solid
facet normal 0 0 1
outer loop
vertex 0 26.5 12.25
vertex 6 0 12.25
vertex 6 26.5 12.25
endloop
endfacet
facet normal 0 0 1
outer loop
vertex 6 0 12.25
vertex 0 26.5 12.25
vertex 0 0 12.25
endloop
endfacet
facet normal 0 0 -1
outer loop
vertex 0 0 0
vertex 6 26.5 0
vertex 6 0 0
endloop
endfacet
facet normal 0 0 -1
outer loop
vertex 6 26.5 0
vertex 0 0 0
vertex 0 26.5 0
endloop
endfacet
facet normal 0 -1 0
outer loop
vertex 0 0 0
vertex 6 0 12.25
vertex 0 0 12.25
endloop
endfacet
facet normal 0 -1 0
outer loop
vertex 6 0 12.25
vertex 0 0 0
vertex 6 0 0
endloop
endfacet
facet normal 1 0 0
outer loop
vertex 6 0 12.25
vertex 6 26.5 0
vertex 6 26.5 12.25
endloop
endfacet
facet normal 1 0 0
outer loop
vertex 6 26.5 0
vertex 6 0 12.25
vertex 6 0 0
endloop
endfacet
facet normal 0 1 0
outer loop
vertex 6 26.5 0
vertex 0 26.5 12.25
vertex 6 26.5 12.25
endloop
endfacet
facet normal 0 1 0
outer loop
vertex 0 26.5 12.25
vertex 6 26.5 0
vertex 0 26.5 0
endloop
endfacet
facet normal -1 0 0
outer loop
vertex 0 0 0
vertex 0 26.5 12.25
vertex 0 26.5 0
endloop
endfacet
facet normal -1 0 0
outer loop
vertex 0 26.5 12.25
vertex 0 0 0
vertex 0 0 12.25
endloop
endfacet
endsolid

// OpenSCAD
// all dimensions in millimeters [in]
// includes matresses and accesories

// parameters
width_outer = 6;
length_outer = 26.5;
height_outer = 12.25;
body_size = [
  width_outer,
  length_outer,
  height_outer
];

// rough model
module body() {
  color("MediumBlue") cube(size=body_size, center=false);
}

// render
body();
